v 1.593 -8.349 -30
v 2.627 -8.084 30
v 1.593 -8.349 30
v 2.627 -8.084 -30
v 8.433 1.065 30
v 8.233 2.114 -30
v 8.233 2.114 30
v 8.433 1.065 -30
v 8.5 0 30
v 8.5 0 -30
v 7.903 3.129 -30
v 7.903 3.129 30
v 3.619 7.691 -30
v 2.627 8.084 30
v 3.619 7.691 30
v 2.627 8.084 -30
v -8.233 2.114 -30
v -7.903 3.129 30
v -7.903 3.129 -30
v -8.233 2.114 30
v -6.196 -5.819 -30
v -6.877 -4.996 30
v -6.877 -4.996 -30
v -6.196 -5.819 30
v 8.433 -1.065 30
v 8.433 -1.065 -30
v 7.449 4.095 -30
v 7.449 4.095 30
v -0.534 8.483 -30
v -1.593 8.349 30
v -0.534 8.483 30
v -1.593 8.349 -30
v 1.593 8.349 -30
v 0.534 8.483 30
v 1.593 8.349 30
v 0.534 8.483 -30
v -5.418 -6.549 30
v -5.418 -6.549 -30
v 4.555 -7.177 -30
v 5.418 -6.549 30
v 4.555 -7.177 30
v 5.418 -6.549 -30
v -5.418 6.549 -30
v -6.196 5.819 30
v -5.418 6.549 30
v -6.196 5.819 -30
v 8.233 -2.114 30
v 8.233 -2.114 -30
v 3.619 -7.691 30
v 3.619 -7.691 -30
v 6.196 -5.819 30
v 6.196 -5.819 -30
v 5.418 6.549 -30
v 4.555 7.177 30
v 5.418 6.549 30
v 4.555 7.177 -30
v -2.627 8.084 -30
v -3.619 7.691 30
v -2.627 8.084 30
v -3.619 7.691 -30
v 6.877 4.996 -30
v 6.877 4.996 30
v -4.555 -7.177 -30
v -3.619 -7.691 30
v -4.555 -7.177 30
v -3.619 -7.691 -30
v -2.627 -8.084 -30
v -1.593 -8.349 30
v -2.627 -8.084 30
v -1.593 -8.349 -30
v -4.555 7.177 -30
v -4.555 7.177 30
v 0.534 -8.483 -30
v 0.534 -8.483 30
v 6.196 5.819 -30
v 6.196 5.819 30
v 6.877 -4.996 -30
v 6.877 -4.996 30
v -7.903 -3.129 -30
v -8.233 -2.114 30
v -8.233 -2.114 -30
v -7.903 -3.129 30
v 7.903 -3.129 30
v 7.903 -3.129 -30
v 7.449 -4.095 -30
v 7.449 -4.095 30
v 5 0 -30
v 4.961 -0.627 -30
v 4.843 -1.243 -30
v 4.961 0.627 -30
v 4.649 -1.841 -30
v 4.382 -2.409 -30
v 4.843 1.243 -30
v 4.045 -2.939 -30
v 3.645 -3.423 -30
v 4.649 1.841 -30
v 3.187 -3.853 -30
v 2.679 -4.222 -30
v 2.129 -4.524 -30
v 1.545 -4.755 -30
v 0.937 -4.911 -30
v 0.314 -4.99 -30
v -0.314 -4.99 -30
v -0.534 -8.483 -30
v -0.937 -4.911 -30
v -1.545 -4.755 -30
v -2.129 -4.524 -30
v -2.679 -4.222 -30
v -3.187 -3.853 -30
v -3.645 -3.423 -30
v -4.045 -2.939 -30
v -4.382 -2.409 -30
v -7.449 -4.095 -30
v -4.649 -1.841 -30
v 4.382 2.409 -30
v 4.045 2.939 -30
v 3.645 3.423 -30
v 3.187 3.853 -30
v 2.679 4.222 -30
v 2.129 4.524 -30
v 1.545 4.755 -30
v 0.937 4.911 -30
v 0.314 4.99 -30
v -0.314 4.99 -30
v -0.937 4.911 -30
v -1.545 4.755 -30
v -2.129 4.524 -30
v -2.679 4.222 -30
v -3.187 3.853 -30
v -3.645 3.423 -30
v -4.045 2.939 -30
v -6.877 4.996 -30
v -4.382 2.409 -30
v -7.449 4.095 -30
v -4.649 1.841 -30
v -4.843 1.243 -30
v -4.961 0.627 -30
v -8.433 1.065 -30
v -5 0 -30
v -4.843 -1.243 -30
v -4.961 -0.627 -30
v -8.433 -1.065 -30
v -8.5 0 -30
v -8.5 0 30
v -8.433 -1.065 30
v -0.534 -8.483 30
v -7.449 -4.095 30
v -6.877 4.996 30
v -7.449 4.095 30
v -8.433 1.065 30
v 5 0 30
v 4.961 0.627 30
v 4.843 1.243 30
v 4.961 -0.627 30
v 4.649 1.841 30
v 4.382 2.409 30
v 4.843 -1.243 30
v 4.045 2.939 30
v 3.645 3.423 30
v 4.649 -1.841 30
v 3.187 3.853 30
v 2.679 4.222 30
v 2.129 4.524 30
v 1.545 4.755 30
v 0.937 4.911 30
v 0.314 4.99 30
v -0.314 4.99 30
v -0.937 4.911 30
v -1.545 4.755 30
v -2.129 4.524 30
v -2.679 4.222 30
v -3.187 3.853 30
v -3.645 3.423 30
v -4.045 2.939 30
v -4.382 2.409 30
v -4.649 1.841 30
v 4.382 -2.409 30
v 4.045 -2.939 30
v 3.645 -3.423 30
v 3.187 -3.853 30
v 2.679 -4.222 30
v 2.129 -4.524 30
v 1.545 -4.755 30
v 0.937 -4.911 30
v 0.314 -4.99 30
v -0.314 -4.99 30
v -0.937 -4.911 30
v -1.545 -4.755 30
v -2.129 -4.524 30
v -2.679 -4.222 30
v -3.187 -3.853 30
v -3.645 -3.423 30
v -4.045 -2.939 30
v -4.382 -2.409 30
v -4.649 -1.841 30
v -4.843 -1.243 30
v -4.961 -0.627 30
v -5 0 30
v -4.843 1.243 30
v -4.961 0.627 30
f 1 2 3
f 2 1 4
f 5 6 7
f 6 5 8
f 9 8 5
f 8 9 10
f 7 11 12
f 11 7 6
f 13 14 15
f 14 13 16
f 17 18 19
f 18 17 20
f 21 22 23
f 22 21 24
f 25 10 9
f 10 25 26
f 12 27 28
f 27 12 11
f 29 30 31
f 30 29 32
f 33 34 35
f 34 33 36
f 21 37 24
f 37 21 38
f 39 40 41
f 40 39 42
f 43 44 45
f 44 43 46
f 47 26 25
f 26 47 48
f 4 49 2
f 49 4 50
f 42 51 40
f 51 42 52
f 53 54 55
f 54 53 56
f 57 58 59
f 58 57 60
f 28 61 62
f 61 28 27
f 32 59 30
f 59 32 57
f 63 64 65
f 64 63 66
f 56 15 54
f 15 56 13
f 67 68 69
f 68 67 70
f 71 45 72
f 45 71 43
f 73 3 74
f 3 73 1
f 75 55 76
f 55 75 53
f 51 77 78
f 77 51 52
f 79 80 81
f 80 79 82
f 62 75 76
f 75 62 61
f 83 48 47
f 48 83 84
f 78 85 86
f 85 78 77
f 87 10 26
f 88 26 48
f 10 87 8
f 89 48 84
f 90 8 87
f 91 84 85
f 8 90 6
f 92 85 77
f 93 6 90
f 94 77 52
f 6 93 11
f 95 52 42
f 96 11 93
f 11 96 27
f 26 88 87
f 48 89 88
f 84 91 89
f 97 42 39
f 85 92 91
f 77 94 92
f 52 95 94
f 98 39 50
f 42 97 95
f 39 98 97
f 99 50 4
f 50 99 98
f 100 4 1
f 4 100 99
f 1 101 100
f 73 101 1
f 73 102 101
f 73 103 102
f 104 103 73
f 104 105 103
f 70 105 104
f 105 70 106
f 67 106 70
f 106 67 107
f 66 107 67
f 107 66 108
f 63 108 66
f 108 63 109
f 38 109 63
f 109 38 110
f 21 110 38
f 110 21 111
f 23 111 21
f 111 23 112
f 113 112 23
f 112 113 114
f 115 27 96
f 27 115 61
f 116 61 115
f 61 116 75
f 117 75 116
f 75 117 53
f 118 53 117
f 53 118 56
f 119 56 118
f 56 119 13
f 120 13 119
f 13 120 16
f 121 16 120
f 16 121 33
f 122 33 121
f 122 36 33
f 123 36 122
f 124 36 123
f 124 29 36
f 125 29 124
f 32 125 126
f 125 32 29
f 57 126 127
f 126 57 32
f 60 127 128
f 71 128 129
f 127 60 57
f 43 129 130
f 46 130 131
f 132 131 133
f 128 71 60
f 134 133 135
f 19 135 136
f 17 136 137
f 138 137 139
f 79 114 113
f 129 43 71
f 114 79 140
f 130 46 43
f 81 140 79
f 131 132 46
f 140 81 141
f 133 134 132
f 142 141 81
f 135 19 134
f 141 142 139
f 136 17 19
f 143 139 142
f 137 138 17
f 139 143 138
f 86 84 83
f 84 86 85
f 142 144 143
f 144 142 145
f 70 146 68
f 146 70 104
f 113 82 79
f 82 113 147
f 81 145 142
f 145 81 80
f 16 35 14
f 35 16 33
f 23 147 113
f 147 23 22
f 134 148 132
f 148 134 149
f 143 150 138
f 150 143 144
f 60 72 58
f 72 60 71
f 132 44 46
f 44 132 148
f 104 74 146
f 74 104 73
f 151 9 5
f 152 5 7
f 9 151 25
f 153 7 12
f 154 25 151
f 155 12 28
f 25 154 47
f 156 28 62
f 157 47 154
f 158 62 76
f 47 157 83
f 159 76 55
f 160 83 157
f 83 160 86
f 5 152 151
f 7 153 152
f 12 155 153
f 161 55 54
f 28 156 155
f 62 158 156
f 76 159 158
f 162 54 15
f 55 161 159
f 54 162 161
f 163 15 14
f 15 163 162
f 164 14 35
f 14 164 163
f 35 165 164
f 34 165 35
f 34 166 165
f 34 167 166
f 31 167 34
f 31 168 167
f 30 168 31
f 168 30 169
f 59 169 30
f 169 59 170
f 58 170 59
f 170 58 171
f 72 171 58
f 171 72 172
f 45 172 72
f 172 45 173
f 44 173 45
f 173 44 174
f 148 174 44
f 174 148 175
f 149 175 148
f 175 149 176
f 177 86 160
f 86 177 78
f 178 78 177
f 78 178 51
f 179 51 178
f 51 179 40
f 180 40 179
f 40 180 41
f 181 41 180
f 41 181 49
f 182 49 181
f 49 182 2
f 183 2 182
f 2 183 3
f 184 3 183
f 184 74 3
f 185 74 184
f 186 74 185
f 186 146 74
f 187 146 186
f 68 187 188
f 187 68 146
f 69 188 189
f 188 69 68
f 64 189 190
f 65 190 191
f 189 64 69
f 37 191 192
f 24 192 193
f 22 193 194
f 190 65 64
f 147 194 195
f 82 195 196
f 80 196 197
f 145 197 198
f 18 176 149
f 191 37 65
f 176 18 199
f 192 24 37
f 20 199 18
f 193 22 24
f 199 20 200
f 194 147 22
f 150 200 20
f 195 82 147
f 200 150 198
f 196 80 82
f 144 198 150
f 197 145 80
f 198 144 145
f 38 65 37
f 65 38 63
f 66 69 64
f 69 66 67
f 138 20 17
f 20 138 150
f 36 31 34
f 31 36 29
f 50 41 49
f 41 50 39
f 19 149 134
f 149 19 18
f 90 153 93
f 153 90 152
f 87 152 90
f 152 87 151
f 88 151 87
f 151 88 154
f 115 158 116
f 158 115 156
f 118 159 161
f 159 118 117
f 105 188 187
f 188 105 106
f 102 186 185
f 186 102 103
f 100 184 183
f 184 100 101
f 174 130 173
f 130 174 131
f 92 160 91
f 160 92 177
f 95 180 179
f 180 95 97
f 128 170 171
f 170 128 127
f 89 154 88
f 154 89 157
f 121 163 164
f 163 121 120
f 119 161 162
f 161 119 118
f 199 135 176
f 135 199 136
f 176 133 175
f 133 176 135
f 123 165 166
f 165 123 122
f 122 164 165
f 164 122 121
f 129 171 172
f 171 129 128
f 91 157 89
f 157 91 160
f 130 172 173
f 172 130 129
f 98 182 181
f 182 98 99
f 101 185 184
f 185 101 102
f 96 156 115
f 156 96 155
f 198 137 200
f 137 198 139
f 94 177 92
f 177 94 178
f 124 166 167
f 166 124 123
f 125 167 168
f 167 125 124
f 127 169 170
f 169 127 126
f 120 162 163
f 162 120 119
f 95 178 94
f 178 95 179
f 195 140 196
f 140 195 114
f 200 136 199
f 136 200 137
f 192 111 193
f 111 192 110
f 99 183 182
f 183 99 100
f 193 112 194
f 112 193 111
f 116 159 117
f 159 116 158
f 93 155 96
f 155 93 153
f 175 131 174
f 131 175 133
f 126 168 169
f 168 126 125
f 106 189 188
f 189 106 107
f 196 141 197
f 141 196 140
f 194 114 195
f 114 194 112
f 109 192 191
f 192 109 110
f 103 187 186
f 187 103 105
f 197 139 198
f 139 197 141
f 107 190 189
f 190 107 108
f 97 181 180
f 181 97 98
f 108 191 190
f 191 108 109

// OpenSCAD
$fn = 50;


difference() {
	union() {
		translate(v = [0, 0, -30.0000000000]) {
			cylinder(h = 60, r = 8.5000000000);
		}
	}
	union() {
		translate(v = [0, 0, -100.0000000000]) {
			cylinder(h = 200, r = 5.0000000000);
		}
	}
}
